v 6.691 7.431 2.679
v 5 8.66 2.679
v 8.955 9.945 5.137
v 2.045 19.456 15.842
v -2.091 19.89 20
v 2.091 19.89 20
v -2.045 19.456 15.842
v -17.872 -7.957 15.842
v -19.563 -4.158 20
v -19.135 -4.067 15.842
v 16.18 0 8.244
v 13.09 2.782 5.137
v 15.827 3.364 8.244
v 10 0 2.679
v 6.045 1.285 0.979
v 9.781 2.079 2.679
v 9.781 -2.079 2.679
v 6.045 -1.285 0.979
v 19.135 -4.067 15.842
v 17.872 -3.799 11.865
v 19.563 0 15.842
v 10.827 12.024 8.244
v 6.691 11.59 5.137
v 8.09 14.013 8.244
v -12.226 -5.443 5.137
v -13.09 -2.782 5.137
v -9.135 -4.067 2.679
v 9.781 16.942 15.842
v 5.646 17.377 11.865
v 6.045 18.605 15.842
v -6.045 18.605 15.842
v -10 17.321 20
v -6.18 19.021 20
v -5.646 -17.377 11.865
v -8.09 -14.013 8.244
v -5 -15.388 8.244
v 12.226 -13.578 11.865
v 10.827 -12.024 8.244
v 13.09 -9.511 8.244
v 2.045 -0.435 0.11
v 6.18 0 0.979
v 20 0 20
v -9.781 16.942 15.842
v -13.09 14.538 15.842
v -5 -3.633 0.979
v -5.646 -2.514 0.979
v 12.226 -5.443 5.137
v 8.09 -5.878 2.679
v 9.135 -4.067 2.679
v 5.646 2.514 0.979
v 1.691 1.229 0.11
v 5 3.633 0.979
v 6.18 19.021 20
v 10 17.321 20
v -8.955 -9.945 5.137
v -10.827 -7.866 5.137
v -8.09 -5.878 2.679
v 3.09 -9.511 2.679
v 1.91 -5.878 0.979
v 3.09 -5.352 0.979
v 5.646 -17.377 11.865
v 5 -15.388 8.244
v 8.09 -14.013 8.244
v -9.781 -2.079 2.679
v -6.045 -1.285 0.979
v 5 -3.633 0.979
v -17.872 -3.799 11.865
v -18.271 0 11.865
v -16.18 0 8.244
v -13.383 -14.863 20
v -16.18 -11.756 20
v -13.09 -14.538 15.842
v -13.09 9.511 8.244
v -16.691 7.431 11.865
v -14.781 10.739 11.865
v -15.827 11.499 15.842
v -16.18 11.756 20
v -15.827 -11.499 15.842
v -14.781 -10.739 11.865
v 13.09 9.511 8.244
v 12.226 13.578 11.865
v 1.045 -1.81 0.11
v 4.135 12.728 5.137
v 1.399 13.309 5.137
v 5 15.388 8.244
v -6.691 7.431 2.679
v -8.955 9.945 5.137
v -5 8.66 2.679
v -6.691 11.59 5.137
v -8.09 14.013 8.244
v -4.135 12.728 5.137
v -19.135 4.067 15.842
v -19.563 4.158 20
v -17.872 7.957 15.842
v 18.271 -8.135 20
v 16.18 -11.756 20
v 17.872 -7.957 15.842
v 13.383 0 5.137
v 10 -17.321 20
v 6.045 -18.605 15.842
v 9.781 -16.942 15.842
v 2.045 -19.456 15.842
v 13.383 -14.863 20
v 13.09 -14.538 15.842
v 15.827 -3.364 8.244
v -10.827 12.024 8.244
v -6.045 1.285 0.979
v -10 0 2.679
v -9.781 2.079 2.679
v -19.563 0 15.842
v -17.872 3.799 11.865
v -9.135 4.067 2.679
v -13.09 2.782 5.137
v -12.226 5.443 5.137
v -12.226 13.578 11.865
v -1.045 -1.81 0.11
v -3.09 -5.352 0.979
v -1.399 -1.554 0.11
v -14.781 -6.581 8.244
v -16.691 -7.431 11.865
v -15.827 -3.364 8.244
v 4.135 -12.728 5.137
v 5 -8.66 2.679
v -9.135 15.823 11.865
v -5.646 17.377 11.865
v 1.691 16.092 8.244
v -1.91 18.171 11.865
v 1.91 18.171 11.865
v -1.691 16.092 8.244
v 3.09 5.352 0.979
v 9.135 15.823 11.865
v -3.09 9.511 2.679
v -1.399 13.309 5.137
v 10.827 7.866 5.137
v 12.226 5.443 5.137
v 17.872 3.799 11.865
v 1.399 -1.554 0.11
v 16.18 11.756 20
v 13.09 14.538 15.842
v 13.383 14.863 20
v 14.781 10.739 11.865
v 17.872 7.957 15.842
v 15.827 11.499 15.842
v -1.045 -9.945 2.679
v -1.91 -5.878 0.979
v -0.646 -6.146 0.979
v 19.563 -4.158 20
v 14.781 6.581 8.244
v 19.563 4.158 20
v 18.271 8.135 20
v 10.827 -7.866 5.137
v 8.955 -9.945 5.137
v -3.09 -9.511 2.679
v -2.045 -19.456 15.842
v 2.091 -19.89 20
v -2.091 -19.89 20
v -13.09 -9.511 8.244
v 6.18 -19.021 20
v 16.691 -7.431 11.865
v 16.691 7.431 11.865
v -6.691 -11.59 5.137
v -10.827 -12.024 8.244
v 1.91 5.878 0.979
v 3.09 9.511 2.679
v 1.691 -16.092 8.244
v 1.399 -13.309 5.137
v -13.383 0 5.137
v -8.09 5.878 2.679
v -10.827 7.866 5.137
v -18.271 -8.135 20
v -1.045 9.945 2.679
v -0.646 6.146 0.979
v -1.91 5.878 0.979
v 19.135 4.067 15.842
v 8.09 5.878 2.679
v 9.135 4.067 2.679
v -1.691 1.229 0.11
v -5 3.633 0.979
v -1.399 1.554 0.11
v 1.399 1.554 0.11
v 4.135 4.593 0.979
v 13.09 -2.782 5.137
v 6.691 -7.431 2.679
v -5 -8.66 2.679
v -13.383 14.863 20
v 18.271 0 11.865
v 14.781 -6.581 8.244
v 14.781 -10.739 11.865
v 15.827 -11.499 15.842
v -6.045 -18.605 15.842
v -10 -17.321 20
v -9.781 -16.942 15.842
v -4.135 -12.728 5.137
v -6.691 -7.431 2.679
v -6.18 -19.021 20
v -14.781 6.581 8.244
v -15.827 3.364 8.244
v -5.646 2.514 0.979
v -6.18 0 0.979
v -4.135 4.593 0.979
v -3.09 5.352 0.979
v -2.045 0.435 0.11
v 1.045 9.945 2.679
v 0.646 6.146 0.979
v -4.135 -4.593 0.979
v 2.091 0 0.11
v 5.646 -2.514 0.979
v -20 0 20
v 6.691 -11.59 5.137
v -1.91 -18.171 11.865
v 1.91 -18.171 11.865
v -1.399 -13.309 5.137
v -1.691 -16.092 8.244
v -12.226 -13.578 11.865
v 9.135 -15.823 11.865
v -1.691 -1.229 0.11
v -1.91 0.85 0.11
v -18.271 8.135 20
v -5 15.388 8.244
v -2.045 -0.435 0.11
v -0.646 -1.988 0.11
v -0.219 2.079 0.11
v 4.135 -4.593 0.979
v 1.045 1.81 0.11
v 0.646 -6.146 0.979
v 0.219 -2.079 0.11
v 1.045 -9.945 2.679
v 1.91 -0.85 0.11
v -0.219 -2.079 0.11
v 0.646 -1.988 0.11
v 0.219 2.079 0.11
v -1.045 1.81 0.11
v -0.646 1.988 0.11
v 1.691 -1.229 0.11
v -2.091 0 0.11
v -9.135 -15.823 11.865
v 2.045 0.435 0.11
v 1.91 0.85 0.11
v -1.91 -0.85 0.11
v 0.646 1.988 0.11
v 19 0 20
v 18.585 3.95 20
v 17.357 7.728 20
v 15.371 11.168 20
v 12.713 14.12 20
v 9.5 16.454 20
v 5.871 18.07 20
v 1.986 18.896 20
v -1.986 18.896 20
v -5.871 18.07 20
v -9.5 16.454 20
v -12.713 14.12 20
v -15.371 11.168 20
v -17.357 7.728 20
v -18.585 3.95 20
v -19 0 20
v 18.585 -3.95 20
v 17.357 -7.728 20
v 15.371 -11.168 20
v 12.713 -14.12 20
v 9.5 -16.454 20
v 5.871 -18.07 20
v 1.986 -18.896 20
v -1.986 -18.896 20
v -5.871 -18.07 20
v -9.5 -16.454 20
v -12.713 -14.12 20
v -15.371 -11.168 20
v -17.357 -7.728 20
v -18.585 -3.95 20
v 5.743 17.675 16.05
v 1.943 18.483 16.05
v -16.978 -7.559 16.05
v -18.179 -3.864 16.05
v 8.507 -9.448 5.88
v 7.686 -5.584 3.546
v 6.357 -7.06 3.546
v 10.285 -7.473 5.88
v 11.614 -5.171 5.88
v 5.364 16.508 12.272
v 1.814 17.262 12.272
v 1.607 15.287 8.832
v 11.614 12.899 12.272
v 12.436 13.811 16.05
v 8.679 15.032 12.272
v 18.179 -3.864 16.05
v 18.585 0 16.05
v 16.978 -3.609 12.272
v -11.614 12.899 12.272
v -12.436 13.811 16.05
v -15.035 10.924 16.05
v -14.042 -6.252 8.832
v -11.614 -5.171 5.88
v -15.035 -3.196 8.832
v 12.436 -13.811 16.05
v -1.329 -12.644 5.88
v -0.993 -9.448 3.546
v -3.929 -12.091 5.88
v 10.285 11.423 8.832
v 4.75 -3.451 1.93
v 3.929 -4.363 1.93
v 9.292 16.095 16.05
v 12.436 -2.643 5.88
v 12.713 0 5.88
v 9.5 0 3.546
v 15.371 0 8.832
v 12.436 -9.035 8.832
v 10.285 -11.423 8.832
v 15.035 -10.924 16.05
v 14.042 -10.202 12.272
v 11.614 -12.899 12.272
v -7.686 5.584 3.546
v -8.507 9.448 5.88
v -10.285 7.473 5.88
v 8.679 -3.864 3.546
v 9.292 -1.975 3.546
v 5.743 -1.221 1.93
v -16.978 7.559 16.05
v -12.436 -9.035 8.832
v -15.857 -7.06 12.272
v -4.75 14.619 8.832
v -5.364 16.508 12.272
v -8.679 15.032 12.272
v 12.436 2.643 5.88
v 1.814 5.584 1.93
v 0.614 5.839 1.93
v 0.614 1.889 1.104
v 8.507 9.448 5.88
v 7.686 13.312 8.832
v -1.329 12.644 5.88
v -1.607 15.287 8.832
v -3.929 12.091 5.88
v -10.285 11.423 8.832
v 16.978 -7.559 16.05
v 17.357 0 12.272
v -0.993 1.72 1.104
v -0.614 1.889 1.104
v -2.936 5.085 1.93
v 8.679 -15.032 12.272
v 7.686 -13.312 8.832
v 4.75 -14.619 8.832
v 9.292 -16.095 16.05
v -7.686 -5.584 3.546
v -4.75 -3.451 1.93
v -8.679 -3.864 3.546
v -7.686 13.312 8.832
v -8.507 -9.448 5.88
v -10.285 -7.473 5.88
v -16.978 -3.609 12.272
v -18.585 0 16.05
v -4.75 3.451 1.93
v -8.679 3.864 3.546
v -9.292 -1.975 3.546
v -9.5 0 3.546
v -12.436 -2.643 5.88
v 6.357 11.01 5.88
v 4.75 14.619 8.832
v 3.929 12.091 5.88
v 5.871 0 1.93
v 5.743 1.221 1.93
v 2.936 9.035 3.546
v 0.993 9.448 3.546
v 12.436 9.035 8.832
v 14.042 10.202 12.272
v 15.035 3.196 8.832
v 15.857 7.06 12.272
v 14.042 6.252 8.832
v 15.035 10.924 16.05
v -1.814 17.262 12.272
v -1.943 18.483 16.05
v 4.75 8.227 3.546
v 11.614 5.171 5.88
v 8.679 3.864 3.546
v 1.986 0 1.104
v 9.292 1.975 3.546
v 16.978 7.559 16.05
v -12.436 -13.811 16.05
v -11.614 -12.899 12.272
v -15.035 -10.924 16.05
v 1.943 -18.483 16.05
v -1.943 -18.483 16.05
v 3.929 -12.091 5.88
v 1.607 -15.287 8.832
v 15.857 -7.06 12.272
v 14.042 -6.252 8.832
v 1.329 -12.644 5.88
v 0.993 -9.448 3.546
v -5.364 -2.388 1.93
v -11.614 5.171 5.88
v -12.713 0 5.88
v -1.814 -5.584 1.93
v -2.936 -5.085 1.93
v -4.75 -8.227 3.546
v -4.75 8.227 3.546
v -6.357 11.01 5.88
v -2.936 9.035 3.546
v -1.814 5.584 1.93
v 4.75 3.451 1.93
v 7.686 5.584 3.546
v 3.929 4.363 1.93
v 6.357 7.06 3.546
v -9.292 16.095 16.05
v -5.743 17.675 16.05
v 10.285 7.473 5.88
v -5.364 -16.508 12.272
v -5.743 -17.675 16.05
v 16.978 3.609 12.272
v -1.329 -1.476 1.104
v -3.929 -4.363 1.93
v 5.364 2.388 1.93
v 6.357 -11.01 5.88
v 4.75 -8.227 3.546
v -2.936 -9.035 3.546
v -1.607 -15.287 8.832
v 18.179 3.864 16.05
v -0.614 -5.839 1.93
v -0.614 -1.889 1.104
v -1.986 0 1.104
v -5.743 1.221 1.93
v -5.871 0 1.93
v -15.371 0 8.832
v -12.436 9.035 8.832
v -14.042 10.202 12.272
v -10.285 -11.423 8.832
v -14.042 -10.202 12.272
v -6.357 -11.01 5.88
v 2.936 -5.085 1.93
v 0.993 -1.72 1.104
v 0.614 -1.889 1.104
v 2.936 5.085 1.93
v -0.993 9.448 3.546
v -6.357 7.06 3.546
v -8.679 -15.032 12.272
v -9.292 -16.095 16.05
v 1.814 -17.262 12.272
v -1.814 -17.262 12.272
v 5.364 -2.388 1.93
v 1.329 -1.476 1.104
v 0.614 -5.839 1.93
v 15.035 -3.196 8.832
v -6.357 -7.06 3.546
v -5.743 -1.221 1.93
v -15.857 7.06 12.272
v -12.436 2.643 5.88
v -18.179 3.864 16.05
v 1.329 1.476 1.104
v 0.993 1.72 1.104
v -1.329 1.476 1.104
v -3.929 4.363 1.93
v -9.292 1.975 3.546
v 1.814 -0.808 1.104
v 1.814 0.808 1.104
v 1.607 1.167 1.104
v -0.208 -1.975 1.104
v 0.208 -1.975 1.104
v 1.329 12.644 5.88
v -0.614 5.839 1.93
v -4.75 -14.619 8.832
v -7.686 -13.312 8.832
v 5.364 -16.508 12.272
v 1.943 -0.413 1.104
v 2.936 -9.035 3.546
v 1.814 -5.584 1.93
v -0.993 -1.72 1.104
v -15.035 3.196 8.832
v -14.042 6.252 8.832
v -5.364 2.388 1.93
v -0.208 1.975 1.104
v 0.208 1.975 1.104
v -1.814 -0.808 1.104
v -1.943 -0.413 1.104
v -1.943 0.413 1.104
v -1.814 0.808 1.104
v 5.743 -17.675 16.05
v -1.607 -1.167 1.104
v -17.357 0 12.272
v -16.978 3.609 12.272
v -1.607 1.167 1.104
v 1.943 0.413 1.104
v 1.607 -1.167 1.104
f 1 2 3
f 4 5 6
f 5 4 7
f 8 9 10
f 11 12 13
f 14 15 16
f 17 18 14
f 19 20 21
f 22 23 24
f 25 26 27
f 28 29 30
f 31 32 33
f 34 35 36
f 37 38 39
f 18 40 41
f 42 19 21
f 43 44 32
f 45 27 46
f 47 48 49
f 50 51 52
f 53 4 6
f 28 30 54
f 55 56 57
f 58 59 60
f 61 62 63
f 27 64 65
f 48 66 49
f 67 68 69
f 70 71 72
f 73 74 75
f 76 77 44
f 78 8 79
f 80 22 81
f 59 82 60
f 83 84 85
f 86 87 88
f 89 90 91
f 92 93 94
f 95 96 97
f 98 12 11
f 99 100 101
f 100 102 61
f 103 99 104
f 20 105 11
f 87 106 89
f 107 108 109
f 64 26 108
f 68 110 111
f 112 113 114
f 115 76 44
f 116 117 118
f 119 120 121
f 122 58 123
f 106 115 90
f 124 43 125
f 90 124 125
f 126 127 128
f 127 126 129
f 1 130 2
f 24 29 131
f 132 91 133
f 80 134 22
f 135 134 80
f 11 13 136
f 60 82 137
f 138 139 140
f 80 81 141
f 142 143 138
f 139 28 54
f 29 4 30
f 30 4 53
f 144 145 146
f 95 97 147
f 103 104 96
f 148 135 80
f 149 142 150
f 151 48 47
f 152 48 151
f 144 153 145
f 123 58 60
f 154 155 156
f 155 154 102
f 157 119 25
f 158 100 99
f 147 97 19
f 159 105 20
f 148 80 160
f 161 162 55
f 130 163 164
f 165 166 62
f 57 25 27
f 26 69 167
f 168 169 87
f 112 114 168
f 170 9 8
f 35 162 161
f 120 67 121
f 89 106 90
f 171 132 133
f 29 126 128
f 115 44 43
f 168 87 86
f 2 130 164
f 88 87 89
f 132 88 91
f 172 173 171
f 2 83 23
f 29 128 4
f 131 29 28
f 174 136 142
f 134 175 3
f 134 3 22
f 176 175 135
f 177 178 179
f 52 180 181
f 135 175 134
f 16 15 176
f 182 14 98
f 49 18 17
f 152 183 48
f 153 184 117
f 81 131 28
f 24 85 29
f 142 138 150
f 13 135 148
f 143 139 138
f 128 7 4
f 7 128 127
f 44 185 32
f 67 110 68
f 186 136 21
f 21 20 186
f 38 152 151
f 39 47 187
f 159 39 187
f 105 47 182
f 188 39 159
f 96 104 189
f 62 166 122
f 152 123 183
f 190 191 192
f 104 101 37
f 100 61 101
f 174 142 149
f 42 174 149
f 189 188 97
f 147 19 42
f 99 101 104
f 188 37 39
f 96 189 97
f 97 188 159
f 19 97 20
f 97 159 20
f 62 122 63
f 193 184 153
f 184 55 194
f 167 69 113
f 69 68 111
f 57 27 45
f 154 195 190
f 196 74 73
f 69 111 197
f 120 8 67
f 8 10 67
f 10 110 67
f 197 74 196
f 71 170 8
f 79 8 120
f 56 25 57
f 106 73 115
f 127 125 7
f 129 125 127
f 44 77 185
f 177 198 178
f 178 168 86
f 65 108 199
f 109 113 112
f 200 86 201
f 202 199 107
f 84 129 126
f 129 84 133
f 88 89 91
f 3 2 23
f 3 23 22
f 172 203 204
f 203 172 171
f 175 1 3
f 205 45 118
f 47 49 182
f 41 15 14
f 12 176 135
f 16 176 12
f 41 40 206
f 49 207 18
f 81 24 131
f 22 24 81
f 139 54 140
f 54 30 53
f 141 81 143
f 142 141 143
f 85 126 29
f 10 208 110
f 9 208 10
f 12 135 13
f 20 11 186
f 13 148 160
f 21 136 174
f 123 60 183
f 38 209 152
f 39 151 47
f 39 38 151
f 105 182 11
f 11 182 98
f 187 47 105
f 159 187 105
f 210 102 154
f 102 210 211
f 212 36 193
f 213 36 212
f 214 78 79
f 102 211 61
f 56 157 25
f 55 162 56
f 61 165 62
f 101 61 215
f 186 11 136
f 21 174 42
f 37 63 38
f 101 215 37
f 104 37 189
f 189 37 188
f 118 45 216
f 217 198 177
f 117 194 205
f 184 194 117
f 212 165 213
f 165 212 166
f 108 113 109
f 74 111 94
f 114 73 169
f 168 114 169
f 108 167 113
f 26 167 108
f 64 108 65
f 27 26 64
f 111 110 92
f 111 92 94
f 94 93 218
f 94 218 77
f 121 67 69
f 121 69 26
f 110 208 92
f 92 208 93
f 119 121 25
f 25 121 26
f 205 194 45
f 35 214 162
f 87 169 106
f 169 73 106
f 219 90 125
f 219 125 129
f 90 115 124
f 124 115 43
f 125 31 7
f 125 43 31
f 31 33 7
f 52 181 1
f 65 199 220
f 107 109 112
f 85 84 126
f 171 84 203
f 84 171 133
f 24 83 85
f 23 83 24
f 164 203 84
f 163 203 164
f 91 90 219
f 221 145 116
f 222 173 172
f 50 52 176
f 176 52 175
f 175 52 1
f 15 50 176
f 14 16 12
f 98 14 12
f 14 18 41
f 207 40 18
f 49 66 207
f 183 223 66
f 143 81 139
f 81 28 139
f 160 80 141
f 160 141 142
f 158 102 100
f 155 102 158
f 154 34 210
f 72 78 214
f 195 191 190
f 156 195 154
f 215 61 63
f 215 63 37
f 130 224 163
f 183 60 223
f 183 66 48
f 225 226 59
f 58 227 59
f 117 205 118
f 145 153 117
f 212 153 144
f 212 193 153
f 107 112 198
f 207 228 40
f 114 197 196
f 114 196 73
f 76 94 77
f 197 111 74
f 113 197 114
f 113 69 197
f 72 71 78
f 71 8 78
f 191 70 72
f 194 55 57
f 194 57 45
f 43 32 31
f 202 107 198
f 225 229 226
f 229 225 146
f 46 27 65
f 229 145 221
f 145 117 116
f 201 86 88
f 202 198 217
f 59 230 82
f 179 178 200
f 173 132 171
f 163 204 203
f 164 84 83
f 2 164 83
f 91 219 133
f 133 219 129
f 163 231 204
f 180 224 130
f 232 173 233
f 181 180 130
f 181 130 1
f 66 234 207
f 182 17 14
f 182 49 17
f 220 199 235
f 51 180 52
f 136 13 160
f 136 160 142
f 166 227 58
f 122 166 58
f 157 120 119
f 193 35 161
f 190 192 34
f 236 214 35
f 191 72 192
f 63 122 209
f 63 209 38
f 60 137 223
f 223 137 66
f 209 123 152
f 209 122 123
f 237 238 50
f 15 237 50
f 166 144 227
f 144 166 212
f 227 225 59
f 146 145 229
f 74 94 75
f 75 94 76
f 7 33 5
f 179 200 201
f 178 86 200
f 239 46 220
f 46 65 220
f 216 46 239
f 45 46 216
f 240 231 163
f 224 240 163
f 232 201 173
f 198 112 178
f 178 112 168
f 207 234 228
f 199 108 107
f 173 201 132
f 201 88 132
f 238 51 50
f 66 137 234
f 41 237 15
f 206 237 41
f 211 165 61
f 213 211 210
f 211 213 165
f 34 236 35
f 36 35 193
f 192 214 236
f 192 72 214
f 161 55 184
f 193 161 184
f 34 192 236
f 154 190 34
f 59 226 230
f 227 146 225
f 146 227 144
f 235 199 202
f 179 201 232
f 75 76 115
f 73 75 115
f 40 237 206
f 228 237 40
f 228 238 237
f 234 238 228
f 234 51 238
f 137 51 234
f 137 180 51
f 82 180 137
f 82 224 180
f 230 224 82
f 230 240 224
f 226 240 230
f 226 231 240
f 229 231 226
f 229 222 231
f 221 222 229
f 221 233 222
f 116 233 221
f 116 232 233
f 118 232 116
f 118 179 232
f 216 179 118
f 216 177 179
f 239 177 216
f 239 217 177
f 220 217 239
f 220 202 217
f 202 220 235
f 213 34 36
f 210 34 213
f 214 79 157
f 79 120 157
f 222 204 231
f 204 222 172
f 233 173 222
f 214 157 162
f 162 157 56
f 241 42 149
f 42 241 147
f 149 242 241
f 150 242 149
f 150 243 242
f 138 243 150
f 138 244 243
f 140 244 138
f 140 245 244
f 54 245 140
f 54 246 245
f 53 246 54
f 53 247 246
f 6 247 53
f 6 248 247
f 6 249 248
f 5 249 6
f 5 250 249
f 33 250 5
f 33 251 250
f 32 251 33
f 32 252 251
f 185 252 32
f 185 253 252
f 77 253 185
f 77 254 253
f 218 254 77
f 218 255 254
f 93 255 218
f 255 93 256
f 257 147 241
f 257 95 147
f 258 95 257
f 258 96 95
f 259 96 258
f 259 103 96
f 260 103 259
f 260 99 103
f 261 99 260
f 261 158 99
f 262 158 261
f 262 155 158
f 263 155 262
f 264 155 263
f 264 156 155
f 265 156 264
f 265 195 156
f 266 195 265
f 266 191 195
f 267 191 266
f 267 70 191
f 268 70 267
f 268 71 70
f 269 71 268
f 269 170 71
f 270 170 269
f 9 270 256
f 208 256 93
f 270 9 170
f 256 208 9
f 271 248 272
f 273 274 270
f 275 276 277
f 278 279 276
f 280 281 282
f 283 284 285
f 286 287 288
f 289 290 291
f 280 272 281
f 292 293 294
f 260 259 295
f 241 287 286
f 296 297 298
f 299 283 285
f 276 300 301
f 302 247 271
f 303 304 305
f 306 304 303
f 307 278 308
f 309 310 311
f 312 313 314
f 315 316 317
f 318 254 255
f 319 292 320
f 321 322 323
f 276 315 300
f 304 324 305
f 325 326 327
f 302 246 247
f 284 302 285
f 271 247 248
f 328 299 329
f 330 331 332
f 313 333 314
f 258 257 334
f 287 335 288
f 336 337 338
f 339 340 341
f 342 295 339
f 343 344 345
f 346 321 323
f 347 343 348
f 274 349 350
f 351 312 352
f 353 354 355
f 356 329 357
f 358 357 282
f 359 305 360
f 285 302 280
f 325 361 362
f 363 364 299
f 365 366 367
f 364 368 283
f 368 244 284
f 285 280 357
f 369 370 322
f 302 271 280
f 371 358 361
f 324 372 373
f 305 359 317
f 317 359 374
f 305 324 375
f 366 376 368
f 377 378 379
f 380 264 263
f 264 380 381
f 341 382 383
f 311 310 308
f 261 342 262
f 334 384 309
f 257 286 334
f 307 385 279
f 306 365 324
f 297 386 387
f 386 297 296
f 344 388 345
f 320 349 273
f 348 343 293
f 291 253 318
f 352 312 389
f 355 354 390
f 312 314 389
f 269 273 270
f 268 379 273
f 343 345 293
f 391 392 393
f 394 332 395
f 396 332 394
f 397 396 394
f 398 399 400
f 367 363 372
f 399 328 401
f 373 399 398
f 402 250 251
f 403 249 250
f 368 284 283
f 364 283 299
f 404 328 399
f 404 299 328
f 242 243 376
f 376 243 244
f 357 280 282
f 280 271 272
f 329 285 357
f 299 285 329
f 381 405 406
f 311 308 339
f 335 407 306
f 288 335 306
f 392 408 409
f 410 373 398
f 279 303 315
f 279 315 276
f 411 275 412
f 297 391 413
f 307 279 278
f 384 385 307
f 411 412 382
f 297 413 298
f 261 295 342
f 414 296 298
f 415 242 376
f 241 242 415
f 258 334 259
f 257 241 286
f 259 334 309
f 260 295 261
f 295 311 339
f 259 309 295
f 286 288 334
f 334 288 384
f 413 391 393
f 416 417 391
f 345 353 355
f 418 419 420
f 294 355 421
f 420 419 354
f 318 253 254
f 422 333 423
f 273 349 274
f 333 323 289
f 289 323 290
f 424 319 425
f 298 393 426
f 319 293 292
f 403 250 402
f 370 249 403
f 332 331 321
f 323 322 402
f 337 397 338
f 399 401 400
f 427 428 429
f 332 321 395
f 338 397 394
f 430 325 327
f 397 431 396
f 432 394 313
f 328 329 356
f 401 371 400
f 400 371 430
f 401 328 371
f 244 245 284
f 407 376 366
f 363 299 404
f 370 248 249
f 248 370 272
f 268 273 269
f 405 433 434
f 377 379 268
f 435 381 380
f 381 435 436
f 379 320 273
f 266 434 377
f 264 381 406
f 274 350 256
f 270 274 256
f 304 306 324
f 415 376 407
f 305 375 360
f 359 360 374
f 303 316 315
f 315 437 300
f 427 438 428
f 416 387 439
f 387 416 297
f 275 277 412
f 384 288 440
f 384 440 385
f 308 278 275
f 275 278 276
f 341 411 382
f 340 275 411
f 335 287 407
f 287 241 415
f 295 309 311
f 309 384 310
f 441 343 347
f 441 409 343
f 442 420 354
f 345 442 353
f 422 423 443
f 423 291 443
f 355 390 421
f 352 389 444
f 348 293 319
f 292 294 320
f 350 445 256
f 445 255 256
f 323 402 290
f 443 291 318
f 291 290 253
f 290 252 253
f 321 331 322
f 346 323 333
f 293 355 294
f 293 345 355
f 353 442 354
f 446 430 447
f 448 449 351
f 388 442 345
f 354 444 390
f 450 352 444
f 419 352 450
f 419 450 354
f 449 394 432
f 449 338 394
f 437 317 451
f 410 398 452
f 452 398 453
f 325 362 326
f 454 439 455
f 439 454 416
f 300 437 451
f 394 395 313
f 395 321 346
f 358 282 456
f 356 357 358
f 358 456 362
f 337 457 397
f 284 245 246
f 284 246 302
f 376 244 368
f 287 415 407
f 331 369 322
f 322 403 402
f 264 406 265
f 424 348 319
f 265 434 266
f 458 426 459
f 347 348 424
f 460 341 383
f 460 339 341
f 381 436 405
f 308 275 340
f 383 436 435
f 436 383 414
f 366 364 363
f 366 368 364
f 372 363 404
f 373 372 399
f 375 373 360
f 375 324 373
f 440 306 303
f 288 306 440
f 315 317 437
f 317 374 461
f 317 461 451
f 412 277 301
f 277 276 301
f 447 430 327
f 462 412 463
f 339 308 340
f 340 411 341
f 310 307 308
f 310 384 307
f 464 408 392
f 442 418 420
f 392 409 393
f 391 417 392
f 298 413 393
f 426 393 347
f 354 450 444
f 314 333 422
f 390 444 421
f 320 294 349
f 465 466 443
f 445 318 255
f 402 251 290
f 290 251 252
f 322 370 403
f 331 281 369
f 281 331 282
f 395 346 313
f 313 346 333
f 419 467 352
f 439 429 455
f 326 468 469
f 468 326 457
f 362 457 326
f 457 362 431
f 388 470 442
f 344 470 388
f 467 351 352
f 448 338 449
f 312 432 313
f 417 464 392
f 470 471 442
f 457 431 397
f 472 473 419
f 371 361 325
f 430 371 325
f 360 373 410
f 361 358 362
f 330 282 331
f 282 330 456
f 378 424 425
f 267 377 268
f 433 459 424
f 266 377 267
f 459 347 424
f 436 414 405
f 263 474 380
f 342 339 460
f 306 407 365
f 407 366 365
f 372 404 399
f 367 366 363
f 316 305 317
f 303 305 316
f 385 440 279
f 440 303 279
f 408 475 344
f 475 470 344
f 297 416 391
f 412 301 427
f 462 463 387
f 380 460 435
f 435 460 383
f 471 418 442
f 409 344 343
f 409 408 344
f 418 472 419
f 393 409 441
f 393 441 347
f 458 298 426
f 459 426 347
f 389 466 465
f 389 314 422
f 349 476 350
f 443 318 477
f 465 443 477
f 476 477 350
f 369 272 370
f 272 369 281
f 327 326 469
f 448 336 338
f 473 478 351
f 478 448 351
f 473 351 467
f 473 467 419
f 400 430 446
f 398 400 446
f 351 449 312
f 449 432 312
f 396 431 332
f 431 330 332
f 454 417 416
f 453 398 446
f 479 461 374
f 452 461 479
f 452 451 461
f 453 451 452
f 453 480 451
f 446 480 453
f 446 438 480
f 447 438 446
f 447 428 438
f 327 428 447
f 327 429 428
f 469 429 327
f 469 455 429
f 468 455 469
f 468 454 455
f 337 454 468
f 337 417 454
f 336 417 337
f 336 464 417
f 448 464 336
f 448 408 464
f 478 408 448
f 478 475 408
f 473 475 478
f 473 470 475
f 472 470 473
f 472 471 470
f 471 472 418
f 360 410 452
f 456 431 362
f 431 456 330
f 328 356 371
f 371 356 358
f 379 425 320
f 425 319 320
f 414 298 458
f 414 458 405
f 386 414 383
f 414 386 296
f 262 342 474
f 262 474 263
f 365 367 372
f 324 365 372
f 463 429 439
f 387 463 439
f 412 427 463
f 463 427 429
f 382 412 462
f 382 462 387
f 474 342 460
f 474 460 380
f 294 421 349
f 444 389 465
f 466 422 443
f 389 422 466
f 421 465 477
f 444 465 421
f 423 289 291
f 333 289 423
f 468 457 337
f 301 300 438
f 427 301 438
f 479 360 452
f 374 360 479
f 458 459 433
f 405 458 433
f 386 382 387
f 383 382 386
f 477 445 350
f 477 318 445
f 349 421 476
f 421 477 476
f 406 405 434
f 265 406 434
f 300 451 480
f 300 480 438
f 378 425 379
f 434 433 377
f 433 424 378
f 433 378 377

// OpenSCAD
translate(v = [0, 0, 20]) {
	difference() {
		sphere(r = 20);
		translate(v = [0, 0, 10]) {
			cube(center = true, size = [40, 50, 20]);
		}
		sphere(r = 19);
	}
}
